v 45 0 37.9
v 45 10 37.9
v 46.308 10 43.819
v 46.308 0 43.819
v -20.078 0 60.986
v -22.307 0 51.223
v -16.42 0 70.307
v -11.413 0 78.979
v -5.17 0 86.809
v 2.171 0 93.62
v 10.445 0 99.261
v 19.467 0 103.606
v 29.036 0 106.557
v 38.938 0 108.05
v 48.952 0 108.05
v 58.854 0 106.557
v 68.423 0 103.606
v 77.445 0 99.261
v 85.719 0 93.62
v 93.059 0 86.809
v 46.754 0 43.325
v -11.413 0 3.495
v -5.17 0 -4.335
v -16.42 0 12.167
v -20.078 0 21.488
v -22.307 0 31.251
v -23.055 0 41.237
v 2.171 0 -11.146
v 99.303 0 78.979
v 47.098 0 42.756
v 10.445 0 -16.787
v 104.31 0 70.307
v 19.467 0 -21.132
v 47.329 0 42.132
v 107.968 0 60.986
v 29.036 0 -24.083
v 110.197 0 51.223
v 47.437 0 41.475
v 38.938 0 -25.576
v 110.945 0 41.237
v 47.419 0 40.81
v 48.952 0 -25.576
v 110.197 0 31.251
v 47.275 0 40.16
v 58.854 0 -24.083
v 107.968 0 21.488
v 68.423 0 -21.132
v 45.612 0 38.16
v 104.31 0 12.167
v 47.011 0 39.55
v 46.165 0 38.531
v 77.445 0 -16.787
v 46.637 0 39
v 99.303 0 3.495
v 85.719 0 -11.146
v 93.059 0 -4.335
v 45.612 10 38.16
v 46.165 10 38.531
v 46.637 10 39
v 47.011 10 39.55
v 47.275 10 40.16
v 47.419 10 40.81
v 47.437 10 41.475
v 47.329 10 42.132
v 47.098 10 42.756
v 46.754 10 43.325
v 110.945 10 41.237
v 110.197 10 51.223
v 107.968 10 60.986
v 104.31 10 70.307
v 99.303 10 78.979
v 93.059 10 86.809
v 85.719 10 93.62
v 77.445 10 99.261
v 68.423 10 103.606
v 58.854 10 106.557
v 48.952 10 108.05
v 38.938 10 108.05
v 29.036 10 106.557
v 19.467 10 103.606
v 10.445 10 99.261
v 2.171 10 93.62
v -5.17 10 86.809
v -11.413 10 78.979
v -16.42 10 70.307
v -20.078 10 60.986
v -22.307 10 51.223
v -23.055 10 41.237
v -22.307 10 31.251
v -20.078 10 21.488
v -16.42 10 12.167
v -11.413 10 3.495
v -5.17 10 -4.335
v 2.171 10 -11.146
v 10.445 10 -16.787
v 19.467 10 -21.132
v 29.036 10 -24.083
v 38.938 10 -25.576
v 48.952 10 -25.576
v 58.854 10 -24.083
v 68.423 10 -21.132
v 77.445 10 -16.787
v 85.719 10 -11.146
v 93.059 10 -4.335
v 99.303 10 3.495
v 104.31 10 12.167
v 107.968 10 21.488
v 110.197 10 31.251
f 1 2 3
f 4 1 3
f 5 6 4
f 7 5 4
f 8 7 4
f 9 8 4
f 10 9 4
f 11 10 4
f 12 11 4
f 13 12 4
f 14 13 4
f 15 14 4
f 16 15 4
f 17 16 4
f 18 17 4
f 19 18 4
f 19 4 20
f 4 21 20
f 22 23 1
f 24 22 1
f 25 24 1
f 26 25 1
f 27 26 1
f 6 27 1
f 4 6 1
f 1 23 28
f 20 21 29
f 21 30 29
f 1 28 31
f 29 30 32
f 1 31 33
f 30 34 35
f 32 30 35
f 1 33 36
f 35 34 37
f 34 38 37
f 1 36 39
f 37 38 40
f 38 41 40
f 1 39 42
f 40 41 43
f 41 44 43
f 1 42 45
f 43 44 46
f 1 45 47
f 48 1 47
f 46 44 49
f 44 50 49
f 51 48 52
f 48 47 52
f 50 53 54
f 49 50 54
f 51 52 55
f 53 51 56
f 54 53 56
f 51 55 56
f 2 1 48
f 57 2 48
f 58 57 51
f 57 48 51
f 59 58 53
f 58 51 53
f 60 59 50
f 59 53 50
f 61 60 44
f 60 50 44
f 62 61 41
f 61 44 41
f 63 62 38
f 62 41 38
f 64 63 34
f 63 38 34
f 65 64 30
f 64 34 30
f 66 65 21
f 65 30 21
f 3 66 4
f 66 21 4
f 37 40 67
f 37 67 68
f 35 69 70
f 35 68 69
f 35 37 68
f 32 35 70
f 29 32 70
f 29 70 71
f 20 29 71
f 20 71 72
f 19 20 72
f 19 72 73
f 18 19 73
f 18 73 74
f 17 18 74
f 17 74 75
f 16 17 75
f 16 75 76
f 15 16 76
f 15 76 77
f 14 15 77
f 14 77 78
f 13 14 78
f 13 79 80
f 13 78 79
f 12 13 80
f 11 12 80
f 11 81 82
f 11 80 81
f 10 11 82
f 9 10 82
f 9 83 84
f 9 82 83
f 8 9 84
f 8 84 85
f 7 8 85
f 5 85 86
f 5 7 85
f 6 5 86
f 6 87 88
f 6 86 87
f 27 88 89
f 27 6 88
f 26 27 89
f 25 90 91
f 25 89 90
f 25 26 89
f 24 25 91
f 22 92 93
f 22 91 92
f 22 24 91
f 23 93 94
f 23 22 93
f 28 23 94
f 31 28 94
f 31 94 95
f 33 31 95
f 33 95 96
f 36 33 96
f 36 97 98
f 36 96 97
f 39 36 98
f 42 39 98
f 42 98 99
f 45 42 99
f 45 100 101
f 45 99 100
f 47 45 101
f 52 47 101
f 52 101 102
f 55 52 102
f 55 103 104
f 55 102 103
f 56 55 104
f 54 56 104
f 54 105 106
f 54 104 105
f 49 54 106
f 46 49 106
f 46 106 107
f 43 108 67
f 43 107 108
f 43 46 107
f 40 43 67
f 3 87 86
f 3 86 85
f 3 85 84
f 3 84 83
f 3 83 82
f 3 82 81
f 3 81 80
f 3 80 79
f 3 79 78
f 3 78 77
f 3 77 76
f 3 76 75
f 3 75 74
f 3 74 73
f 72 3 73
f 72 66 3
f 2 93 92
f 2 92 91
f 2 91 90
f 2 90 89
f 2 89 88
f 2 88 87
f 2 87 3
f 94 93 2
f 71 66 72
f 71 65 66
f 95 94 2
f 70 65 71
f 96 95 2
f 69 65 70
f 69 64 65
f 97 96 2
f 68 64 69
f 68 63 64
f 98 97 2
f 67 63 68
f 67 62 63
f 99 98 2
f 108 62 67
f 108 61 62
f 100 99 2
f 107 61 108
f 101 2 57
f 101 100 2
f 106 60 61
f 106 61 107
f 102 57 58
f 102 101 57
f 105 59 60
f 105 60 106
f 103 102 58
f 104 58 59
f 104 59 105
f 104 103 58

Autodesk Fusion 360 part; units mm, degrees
sketch "Sketch1" plane through (0, 0, 0) normal (0, 1, 0) x (1, 0, 0) in component "wheel"
  circle A0 centre (43.9449, -41.237) radius 67
  circle A1 centre (43.9449, -41.237) radius 3.5
  dimension "d1" = 134
  dimension "d2" = 7
extrude "Extrude1" add sketch "Sketch1" along normal blind 10 in component "wheel"
sketch "Sketch2" plane through (0, 10, 0) normal (0, 1, 0) x (-1, 0, 0) in component "wheel"
  circle A0 centre (-43.9449, 41.237) radius 3.5
  circle A1 centre (-43.9449, 41.237) radius 67
  line L0 (-44.9997, 37.8998) -> (-46.3076, 43.8192)
  dimension "d5" = 1.75
extrude "Extrude2" add sketch "Sketch2" against normal blind 10 contours A0 L0 picked at (-43.9295, 40.8175) in component "wheel"
component "wheel" placed x (1, 0, 0) y (0, 1, 0) z (0, 0, 1) at (0, 0, 0)
